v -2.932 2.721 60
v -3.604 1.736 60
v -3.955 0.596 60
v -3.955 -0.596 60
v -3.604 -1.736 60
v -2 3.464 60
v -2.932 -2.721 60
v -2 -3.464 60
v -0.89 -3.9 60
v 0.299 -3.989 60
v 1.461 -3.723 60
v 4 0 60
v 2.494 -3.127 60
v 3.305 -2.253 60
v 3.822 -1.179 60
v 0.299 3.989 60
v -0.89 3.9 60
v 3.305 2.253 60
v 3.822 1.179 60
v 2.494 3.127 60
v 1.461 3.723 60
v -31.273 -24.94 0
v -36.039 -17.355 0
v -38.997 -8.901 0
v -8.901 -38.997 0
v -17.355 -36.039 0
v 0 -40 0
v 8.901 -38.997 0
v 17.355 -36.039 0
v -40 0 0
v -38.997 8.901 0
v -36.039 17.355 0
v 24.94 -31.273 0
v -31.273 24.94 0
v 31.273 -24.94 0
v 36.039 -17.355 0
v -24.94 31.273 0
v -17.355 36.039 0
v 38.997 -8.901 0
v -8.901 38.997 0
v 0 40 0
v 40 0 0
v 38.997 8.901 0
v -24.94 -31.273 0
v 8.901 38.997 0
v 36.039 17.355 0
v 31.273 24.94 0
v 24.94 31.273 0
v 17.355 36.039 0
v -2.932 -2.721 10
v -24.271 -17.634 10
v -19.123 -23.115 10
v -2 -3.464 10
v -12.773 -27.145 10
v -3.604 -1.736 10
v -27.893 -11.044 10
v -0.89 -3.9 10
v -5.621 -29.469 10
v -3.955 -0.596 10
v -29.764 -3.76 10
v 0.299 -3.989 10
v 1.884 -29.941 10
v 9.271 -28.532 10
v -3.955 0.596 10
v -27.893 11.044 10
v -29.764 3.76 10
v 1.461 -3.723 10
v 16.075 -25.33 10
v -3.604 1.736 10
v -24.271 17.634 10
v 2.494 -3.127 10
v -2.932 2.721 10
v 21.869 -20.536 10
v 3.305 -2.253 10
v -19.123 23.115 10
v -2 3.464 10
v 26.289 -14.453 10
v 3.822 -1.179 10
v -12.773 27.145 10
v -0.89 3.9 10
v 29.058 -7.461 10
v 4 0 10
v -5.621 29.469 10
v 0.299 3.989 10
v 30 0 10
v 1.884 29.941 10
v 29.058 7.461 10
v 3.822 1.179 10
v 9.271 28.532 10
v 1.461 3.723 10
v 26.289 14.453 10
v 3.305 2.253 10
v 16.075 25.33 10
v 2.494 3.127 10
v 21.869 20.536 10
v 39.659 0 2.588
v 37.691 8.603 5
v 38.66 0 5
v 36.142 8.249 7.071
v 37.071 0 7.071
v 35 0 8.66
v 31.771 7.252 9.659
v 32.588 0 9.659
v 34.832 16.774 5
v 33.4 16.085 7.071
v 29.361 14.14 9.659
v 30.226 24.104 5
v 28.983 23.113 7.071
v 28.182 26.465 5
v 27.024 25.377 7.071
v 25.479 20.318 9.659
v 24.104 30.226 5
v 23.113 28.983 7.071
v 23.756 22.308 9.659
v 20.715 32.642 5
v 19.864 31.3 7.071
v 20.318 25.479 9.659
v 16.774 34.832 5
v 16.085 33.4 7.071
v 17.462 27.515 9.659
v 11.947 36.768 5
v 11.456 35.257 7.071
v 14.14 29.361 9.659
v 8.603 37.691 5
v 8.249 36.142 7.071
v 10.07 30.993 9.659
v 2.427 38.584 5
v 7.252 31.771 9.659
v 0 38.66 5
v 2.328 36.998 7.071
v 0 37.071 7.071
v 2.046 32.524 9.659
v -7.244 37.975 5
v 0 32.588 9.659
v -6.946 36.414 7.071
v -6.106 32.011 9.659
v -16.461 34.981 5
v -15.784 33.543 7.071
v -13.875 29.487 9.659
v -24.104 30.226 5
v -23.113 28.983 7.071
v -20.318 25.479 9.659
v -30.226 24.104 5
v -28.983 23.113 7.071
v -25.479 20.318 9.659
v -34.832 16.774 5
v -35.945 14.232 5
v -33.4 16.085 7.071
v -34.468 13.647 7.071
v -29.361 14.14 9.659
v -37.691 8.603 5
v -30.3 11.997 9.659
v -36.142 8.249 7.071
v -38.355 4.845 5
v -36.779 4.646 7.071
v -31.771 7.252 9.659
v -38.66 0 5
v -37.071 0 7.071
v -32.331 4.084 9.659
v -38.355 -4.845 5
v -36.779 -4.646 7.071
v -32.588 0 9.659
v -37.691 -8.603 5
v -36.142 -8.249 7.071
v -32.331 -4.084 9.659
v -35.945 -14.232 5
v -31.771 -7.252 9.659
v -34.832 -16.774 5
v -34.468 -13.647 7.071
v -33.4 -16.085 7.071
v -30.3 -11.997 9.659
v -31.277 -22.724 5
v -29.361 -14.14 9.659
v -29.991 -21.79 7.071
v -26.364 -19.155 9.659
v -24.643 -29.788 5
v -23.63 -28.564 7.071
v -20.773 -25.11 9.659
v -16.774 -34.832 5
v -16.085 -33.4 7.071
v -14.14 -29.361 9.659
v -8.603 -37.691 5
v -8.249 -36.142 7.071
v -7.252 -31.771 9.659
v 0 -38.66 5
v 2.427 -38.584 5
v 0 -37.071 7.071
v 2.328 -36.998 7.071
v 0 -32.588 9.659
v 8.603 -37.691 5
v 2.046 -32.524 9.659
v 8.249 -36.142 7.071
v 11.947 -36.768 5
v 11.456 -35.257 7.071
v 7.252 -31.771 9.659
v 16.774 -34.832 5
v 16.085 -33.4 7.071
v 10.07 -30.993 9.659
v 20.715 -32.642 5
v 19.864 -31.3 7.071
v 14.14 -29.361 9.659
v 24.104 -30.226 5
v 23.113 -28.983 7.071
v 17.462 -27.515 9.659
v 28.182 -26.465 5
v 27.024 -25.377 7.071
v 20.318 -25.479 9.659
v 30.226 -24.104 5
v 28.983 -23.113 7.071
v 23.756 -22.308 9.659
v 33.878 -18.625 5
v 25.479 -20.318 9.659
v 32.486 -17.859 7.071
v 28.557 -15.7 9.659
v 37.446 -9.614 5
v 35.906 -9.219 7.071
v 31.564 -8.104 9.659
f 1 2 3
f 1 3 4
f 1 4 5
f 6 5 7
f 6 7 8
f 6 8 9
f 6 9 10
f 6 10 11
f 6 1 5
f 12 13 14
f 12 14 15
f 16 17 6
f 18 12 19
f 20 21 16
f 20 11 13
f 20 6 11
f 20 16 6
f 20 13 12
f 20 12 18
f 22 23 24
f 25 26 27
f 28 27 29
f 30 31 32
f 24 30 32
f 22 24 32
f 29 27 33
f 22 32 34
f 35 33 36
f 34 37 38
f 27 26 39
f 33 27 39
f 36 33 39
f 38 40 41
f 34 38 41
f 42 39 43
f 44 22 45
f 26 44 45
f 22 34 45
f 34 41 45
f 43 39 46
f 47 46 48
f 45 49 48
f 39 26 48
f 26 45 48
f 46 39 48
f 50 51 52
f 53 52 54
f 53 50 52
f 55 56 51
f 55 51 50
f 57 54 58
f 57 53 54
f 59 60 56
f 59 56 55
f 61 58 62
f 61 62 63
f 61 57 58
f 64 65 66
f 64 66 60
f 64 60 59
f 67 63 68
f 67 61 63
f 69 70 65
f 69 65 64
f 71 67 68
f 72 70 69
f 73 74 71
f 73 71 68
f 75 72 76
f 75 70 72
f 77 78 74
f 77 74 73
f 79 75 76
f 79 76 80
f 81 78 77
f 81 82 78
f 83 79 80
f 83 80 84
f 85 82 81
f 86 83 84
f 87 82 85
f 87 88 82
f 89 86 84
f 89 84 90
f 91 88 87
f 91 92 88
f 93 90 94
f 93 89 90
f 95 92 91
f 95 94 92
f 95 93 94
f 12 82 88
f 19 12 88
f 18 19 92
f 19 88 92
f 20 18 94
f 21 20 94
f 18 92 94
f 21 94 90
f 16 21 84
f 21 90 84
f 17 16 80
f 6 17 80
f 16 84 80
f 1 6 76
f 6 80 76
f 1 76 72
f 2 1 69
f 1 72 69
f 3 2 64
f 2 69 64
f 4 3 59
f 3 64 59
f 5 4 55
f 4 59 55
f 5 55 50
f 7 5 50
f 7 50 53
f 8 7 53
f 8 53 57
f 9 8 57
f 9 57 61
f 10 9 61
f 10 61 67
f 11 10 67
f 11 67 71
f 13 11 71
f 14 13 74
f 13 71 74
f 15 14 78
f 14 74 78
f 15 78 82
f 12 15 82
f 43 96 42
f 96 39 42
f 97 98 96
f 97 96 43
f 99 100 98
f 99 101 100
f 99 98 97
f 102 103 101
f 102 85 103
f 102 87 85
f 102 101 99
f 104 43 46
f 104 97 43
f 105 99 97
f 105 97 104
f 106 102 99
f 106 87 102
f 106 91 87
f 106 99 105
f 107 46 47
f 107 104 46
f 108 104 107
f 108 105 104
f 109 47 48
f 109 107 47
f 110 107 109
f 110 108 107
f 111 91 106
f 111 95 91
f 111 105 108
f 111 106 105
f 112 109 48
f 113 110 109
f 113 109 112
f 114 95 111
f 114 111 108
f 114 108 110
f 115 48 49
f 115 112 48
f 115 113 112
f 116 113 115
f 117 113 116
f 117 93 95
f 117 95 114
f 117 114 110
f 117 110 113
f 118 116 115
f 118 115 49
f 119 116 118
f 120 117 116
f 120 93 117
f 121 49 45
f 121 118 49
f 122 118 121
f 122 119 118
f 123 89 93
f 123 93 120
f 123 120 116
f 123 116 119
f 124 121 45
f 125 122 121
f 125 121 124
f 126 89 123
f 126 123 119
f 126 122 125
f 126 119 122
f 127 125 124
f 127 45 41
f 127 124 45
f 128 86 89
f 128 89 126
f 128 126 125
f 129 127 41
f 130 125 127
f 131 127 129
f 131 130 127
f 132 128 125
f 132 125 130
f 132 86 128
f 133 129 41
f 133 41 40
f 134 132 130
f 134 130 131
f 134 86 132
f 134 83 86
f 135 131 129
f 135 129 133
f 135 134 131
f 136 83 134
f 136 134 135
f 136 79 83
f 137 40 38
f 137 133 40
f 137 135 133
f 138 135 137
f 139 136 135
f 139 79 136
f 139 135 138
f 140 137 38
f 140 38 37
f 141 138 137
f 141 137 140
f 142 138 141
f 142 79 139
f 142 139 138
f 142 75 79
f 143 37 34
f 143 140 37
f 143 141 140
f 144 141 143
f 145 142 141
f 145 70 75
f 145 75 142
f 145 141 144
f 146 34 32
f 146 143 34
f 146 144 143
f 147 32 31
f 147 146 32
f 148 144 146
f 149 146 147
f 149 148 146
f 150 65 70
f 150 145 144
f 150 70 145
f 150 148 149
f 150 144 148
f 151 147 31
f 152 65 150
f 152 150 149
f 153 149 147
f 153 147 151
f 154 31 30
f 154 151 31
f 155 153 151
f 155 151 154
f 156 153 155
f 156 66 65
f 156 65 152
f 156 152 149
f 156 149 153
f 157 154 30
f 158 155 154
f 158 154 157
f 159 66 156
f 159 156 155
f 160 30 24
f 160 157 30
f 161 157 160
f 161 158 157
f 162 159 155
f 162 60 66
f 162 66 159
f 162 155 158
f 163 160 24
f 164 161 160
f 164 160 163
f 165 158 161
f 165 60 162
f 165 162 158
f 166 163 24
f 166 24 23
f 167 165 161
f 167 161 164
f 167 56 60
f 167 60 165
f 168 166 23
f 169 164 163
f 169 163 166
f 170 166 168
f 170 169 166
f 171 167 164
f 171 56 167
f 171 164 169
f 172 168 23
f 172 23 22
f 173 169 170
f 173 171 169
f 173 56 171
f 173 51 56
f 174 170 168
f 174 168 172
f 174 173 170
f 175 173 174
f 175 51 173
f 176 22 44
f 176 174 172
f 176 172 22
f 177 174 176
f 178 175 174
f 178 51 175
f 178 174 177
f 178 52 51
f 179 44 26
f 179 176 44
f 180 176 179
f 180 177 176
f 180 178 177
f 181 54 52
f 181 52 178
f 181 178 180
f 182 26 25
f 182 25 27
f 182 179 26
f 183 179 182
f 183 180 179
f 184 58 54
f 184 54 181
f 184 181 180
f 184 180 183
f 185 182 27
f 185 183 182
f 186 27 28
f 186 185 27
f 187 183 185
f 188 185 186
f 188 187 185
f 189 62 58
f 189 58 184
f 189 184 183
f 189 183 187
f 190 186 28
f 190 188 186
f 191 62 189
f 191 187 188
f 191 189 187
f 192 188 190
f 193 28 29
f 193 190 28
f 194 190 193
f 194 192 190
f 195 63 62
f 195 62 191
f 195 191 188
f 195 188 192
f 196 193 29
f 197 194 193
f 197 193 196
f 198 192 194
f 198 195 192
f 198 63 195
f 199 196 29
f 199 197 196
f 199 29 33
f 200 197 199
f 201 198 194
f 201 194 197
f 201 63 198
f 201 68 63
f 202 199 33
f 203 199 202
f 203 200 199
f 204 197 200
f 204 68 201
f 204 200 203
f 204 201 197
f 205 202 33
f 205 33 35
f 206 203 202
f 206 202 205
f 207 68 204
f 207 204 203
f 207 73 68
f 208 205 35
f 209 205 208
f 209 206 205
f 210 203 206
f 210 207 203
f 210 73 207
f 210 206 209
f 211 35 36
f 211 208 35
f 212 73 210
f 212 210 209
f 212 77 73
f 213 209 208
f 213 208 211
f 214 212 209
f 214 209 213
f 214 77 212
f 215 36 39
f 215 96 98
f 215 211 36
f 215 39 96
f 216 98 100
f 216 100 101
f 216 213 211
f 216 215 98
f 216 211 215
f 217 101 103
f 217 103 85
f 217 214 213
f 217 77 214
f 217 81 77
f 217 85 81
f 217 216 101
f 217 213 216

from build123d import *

# Parameters (mm, degrees)
ESQUISSE1_R        = 40
BOSS_EXTRU_1_DEPTH = 10
CONG_1_R           = 10
ESQUISSE2_R        = 4
BOSS_EXTRU_2_DEPTH = 50


with BuildPart() as part:
    # Esquisse1 → Boss.-Extru.1 (new body)
    with BuildSketch(Plane.XY):
        Circle(ESQUISSE1_R)
    extrude(amount=BOSS_EXTRU_1_DEPTH)

    # Congé1
    cong_1_edges = [part.edges().sort_by_distance(p)[0] for p in [
        (-40, 0, 10),
    ]]
    fillet(cong_1_edges, radius=CONG_1_R - 0.0001)  # a hair under: the kernel refuses the full size

    # Esquisse2 → Boss.-Extru.2 (add)
    with BuildSketch(Plane.XY.offset(10)):
        Circle(ESQUISSE2_R)
    extrude(amount=BOSS_EXTRU_2_DEPTH)


solid = part.part
